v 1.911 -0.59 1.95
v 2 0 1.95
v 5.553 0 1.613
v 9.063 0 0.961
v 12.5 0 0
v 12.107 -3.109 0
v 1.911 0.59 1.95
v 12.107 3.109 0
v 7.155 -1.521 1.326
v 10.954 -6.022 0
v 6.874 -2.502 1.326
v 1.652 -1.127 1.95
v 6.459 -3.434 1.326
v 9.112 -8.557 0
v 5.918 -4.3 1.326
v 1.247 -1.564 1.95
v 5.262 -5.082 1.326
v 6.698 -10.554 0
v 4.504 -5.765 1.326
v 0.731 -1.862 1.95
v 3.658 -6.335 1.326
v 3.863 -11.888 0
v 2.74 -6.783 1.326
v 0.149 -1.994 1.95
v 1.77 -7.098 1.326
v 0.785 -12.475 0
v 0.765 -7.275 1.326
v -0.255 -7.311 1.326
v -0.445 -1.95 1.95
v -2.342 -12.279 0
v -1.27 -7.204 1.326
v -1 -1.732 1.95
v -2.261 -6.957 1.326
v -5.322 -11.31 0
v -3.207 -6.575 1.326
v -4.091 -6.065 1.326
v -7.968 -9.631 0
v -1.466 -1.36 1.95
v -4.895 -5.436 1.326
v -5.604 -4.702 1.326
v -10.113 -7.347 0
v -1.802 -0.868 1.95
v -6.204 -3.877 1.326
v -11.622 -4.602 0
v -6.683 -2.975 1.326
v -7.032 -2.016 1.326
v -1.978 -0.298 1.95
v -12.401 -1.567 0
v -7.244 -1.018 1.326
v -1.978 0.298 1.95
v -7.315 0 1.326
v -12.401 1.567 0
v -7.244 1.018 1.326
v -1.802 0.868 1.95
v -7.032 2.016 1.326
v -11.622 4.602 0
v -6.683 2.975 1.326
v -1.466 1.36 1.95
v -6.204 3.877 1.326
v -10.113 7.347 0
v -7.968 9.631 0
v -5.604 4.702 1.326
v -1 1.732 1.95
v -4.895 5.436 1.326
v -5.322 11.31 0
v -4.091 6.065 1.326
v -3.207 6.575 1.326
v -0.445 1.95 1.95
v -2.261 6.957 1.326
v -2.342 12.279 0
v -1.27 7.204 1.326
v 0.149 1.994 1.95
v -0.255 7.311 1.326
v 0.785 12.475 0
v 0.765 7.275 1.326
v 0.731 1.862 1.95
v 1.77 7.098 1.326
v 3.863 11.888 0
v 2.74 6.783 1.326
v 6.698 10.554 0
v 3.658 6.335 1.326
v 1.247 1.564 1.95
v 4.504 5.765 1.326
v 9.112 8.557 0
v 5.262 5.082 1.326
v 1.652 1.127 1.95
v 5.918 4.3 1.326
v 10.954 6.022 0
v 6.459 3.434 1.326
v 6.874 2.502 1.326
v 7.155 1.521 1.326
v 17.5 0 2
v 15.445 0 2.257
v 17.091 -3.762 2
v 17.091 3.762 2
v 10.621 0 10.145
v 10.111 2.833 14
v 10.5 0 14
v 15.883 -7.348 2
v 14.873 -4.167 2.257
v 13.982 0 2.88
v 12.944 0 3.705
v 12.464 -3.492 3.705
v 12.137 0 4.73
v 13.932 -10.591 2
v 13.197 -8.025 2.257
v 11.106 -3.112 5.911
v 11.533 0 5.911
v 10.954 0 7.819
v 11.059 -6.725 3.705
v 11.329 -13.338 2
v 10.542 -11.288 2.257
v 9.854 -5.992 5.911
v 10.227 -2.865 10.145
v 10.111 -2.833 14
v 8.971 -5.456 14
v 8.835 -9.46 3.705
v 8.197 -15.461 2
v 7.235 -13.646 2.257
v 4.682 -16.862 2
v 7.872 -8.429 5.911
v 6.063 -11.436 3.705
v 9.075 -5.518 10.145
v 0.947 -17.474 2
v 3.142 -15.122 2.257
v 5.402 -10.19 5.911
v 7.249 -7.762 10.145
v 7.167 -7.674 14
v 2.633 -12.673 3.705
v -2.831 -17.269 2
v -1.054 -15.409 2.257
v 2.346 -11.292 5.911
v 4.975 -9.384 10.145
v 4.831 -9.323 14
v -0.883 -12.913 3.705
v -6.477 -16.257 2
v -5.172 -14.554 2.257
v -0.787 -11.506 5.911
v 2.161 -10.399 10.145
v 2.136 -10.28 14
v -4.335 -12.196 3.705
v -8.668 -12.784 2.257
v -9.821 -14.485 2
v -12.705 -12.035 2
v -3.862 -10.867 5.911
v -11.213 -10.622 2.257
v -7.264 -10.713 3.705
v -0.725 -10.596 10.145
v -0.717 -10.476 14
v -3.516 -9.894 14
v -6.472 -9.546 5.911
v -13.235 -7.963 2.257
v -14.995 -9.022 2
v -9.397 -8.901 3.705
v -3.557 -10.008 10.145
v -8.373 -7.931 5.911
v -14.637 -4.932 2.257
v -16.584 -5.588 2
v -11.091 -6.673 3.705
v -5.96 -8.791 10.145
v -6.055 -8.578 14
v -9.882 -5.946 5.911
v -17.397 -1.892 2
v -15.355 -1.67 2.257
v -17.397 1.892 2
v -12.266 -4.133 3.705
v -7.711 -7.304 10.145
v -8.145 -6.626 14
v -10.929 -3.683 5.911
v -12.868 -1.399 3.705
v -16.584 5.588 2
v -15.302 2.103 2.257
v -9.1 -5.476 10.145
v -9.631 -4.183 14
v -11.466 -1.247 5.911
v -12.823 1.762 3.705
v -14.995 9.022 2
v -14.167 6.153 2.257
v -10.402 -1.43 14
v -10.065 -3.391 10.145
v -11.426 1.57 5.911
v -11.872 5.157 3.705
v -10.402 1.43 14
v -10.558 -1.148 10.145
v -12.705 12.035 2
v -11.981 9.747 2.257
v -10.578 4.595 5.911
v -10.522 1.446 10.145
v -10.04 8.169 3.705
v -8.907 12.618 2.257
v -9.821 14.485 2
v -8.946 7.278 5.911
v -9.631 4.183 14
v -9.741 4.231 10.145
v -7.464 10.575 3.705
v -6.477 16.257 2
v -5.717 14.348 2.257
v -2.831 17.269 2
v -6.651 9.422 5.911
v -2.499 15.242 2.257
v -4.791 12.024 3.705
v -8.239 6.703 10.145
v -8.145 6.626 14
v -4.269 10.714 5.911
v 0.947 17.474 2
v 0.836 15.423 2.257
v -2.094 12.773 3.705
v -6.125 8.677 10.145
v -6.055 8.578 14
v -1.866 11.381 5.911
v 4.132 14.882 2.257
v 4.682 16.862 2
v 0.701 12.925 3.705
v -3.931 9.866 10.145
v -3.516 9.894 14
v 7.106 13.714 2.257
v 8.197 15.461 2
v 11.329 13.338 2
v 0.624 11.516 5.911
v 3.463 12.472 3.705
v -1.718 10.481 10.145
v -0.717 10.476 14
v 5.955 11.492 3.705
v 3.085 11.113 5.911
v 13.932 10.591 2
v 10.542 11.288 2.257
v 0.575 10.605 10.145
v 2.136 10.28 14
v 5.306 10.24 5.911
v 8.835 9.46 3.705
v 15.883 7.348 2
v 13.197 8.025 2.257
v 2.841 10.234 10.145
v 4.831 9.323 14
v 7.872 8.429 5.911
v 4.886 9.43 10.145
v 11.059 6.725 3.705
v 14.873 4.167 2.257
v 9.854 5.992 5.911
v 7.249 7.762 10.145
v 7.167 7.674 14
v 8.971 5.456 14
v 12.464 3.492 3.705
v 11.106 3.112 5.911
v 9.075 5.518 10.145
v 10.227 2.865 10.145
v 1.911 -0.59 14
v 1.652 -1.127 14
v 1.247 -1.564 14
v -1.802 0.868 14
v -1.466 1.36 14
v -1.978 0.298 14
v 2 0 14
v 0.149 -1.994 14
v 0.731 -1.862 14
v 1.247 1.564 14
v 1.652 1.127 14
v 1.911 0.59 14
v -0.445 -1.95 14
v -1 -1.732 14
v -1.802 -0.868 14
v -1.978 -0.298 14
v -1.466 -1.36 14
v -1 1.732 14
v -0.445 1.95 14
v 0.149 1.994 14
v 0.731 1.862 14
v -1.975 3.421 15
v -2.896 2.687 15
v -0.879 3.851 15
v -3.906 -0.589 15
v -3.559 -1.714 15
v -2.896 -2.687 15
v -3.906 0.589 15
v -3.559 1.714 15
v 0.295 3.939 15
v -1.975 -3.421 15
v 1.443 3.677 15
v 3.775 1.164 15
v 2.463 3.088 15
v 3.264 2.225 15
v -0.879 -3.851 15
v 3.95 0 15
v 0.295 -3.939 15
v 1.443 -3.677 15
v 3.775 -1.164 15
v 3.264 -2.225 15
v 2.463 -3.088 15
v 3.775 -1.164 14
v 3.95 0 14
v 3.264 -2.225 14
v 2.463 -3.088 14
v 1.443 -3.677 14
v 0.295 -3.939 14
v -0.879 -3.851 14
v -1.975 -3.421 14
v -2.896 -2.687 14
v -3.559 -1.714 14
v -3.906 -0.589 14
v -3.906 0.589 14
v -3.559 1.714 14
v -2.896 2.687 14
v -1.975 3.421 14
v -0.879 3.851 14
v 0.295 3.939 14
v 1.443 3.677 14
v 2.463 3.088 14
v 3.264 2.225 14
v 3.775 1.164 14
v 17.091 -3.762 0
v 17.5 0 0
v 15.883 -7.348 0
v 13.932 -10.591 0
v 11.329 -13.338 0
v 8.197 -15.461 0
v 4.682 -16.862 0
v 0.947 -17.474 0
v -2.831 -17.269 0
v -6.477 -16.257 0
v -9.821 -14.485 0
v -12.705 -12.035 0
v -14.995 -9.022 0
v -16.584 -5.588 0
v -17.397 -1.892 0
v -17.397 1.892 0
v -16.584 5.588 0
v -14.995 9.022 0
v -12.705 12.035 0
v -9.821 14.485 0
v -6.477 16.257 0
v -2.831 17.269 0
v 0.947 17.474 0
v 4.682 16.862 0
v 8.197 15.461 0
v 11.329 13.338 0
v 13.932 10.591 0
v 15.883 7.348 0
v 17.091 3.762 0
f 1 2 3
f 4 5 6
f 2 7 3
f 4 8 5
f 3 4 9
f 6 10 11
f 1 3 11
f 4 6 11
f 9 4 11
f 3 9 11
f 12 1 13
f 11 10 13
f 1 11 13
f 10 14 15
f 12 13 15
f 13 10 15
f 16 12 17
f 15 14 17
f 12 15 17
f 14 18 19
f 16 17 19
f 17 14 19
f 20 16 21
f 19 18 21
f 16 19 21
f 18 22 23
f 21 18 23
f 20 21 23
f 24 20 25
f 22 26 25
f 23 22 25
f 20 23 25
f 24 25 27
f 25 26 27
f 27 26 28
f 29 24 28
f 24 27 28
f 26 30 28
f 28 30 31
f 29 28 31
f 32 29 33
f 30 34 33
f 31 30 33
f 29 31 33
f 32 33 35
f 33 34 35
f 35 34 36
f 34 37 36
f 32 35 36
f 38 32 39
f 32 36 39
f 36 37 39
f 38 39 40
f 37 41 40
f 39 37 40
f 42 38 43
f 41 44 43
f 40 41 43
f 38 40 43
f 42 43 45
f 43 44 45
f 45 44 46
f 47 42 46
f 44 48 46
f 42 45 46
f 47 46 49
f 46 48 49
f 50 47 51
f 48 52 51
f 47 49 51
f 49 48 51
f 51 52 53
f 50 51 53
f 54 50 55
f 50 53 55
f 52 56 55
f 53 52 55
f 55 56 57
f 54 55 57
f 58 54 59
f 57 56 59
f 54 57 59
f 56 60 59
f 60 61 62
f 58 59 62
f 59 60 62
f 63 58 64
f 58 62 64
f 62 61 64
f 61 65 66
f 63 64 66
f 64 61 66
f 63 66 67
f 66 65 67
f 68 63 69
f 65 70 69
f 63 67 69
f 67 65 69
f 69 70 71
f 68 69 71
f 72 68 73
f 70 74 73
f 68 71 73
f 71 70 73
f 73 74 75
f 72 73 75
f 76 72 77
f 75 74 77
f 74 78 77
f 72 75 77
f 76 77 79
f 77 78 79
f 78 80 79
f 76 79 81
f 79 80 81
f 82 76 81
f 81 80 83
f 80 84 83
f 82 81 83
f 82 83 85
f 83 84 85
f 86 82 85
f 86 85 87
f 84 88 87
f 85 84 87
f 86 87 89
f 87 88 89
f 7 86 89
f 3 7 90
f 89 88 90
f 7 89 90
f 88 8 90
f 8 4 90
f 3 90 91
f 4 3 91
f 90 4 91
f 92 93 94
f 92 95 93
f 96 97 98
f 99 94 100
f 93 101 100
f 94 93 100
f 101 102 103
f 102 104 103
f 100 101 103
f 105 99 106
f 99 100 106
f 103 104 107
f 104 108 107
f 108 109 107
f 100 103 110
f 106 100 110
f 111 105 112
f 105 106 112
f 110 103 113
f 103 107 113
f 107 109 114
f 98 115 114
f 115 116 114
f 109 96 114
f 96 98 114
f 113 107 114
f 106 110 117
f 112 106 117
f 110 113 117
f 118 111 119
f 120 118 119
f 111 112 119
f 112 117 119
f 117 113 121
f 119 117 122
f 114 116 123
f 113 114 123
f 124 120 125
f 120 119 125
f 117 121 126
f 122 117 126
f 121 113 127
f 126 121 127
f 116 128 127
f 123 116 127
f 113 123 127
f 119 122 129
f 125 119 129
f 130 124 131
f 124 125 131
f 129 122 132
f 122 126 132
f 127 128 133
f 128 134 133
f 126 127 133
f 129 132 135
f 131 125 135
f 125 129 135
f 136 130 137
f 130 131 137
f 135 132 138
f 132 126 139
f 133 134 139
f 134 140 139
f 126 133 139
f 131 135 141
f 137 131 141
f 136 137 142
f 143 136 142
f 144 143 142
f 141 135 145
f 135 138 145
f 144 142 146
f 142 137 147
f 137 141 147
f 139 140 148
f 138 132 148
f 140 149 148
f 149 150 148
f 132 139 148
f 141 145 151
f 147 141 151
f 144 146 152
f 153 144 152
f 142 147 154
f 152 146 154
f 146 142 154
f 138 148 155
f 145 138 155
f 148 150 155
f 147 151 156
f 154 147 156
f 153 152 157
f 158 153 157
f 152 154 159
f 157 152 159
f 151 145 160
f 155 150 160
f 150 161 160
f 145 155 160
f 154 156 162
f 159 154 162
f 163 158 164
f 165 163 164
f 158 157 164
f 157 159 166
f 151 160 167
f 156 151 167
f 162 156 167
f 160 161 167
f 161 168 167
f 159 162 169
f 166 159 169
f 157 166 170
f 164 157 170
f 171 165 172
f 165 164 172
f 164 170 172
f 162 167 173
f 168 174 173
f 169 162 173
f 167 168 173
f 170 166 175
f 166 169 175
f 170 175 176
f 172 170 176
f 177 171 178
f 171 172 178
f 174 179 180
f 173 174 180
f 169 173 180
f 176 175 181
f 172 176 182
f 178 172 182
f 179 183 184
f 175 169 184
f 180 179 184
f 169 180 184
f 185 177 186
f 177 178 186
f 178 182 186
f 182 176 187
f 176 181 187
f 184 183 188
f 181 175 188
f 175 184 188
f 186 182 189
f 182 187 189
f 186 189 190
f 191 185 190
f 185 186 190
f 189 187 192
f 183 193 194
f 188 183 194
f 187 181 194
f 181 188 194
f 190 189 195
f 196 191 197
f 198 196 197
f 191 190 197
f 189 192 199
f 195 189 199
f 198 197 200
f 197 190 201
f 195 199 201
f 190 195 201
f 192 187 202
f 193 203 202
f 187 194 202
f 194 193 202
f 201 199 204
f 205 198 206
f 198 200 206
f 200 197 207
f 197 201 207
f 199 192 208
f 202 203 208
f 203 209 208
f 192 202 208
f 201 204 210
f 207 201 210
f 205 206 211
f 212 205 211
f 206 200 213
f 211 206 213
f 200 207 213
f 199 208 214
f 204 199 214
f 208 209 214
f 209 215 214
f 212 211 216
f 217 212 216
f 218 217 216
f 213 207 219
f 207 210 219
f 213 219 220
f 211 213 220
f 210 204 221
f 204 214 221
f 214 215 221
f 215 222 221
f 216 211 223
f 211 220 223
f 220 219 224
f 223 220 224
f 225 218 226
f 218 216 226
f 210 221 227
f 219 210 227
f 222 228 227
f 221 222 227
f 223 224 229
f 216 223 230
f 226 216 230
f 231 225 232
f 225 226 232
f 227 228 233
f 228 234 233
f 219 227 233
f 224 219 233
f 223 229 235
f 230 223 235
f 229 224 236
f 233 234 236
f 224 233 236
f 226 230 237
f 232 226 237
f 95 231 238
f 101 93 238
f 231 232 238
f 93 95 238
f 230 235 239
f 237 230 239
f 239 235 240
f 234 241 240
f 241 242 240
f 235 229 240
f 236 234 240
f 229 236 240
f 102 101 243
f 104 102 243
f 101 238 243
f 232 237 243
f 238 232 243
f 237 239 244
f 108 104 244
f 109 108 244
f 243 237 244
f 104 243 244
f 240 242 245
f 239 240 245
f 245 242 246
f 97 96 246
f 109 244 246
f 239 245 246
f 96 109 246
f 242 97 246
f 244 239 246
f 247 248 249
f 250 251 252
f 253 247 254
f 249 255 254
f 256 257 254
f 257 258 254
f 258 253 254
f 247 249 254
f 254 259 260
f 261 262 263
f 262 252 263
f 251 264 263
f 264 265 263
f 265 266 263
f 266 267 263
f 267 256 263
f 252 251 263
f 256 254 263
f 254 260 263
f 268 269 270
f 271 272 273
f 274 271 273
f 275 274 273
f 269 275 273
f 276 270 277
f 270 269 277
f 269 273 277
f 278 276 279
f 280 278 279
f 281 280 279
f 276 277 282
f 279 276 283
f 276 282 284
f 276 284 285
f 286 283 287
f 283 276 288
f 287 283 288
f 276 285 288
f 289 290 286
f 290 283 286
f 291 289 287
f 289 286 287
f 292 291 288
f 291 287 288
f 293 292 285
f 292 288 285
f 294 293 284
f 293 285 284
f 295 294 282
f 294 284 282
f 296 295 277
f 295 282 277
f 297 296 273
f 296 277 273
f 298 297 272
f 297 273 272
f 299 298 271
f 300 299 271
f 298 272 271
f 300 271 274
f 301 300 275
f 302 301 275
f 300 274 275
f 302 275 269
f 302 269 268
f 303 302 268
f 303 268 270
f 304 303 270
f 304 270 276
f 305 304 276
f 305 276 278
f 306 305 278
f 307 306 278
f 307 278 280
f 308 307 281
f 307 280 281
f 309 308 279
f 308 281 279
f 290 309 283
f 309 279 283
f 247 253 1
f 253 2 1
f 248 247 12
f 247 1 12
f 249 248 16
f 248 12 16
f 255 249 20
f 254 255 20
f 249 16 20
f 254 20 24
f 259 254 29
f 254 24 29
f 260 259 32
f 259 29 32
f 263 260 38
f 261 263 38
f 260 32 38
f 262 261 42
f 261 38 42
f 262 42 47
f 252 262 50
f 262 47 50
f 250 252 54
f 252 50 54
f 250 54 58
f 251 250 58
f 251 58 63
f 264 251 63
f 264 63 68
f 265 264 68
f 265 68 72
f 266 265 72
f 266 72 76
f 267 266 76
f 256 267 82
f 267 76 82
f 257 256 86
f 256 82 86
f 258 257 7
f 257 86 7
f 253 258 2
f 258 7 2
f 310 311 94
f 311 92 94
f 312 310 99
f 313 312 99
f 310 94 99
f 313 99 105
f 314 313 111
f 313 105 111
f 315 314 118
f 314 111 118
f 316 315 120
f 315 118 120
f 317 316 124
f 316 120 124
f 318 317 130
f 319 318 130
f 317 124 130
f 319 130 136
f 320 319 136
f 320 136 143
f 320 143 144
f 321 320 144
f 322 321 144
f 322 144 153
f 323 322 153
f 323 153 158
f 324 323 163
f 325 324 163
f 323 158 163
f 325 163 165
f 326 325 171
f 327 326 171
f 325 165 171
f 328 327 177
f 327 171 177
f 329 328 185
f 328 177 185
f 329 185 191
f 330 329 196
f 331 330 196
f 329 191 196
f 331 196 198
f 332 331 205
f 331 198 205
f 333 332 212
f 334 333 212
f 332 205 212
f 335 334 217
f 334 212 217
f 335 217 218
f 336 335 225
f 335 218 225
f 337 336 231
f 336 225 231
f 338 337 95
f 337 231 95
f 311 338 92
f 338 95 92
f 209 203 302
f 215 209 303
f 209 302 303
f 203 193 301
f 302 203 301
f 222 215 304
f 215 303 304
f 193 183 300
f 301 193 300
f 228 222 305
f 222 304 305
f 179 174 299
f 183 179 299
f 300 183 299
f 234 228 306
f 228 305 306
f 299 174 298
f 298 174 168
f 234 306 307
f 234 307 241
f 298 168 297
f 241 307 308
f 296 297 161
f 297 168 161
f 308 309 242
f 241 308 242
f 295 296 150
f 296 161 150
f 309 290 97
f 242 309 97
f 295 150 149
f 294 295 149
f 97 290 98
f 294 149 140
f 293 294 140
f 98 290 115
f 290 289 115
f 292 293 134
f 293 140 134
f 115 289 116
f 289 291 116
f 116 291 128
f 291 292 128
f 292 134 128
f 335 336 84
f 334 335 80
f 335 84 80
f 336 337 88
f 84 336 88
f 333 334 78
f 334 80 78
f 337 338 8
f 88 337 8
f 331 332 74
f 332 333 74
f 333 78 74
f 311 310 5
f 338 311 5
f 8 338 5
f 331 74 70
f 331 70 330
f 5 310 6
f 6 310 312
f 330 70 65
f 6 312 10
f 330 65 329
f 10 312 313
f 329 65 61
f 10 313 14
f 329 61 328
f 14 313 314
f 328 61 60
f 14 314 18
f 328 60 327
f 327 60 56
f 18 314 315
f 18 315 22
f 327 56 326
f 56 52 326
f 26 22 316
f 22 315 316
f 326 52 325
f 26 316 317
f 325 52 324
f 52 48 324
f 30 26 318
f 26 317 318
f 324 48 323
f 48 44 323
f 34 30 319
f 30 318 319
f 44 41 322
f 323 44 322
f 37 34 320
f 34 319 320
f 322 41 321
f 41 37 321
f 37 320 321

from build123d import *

# Parameters (mm, degrees)
F0_W = 2
F0_H = 1


# Not quite as in the source:
# - a feature names something its author has since deleted; it is built from what else it names


with BuildPart() as f1:
    # F0 (on Front) → F1 (revolve)
    with BuildSketch(Plane.XZ):
        with BuildLine():
            Line((10.5, 14), (3.95, 14))
            Line((3.95, 14), (2, 14))
            Line((2, 14), (2, 2))
            Line((2, 2), (17.5, 2))
            add(Edge.make_bspline(
                [(17.5, 2), (10.2541549131, 2), (10.5480328202, 10.096937418), (10.5, 14)],
                knots=[0, 0, 0, 0, 13.8924439894, 13.8924439894, 13.8924439894, 13.8924439894], degree=3))
        make_face()
        with BuildLine():
            Line((17.5, 0), (17.5, 2))
            Line((17.5, 2), (2, 2))
            Line((2, 2), (2, 1.9500468603))
            ThreePointArc((2, 1.9500468603), (7.3152696935, 1.3264671807), (12.5, 0))
            Line((12.5, 0), (17.5, 0))
        make_face()
        with Locations((1, 14.5)):
            Rectangle(F0_W, F0_H)
        Polygon((2, 14), (3.95, 14), (3.95, 15), (2.3, 15), (2, 15), align=None)
    revolve(axis=Axis((0, 0, 7), (0, 0, -1)))


solid = f1.part
